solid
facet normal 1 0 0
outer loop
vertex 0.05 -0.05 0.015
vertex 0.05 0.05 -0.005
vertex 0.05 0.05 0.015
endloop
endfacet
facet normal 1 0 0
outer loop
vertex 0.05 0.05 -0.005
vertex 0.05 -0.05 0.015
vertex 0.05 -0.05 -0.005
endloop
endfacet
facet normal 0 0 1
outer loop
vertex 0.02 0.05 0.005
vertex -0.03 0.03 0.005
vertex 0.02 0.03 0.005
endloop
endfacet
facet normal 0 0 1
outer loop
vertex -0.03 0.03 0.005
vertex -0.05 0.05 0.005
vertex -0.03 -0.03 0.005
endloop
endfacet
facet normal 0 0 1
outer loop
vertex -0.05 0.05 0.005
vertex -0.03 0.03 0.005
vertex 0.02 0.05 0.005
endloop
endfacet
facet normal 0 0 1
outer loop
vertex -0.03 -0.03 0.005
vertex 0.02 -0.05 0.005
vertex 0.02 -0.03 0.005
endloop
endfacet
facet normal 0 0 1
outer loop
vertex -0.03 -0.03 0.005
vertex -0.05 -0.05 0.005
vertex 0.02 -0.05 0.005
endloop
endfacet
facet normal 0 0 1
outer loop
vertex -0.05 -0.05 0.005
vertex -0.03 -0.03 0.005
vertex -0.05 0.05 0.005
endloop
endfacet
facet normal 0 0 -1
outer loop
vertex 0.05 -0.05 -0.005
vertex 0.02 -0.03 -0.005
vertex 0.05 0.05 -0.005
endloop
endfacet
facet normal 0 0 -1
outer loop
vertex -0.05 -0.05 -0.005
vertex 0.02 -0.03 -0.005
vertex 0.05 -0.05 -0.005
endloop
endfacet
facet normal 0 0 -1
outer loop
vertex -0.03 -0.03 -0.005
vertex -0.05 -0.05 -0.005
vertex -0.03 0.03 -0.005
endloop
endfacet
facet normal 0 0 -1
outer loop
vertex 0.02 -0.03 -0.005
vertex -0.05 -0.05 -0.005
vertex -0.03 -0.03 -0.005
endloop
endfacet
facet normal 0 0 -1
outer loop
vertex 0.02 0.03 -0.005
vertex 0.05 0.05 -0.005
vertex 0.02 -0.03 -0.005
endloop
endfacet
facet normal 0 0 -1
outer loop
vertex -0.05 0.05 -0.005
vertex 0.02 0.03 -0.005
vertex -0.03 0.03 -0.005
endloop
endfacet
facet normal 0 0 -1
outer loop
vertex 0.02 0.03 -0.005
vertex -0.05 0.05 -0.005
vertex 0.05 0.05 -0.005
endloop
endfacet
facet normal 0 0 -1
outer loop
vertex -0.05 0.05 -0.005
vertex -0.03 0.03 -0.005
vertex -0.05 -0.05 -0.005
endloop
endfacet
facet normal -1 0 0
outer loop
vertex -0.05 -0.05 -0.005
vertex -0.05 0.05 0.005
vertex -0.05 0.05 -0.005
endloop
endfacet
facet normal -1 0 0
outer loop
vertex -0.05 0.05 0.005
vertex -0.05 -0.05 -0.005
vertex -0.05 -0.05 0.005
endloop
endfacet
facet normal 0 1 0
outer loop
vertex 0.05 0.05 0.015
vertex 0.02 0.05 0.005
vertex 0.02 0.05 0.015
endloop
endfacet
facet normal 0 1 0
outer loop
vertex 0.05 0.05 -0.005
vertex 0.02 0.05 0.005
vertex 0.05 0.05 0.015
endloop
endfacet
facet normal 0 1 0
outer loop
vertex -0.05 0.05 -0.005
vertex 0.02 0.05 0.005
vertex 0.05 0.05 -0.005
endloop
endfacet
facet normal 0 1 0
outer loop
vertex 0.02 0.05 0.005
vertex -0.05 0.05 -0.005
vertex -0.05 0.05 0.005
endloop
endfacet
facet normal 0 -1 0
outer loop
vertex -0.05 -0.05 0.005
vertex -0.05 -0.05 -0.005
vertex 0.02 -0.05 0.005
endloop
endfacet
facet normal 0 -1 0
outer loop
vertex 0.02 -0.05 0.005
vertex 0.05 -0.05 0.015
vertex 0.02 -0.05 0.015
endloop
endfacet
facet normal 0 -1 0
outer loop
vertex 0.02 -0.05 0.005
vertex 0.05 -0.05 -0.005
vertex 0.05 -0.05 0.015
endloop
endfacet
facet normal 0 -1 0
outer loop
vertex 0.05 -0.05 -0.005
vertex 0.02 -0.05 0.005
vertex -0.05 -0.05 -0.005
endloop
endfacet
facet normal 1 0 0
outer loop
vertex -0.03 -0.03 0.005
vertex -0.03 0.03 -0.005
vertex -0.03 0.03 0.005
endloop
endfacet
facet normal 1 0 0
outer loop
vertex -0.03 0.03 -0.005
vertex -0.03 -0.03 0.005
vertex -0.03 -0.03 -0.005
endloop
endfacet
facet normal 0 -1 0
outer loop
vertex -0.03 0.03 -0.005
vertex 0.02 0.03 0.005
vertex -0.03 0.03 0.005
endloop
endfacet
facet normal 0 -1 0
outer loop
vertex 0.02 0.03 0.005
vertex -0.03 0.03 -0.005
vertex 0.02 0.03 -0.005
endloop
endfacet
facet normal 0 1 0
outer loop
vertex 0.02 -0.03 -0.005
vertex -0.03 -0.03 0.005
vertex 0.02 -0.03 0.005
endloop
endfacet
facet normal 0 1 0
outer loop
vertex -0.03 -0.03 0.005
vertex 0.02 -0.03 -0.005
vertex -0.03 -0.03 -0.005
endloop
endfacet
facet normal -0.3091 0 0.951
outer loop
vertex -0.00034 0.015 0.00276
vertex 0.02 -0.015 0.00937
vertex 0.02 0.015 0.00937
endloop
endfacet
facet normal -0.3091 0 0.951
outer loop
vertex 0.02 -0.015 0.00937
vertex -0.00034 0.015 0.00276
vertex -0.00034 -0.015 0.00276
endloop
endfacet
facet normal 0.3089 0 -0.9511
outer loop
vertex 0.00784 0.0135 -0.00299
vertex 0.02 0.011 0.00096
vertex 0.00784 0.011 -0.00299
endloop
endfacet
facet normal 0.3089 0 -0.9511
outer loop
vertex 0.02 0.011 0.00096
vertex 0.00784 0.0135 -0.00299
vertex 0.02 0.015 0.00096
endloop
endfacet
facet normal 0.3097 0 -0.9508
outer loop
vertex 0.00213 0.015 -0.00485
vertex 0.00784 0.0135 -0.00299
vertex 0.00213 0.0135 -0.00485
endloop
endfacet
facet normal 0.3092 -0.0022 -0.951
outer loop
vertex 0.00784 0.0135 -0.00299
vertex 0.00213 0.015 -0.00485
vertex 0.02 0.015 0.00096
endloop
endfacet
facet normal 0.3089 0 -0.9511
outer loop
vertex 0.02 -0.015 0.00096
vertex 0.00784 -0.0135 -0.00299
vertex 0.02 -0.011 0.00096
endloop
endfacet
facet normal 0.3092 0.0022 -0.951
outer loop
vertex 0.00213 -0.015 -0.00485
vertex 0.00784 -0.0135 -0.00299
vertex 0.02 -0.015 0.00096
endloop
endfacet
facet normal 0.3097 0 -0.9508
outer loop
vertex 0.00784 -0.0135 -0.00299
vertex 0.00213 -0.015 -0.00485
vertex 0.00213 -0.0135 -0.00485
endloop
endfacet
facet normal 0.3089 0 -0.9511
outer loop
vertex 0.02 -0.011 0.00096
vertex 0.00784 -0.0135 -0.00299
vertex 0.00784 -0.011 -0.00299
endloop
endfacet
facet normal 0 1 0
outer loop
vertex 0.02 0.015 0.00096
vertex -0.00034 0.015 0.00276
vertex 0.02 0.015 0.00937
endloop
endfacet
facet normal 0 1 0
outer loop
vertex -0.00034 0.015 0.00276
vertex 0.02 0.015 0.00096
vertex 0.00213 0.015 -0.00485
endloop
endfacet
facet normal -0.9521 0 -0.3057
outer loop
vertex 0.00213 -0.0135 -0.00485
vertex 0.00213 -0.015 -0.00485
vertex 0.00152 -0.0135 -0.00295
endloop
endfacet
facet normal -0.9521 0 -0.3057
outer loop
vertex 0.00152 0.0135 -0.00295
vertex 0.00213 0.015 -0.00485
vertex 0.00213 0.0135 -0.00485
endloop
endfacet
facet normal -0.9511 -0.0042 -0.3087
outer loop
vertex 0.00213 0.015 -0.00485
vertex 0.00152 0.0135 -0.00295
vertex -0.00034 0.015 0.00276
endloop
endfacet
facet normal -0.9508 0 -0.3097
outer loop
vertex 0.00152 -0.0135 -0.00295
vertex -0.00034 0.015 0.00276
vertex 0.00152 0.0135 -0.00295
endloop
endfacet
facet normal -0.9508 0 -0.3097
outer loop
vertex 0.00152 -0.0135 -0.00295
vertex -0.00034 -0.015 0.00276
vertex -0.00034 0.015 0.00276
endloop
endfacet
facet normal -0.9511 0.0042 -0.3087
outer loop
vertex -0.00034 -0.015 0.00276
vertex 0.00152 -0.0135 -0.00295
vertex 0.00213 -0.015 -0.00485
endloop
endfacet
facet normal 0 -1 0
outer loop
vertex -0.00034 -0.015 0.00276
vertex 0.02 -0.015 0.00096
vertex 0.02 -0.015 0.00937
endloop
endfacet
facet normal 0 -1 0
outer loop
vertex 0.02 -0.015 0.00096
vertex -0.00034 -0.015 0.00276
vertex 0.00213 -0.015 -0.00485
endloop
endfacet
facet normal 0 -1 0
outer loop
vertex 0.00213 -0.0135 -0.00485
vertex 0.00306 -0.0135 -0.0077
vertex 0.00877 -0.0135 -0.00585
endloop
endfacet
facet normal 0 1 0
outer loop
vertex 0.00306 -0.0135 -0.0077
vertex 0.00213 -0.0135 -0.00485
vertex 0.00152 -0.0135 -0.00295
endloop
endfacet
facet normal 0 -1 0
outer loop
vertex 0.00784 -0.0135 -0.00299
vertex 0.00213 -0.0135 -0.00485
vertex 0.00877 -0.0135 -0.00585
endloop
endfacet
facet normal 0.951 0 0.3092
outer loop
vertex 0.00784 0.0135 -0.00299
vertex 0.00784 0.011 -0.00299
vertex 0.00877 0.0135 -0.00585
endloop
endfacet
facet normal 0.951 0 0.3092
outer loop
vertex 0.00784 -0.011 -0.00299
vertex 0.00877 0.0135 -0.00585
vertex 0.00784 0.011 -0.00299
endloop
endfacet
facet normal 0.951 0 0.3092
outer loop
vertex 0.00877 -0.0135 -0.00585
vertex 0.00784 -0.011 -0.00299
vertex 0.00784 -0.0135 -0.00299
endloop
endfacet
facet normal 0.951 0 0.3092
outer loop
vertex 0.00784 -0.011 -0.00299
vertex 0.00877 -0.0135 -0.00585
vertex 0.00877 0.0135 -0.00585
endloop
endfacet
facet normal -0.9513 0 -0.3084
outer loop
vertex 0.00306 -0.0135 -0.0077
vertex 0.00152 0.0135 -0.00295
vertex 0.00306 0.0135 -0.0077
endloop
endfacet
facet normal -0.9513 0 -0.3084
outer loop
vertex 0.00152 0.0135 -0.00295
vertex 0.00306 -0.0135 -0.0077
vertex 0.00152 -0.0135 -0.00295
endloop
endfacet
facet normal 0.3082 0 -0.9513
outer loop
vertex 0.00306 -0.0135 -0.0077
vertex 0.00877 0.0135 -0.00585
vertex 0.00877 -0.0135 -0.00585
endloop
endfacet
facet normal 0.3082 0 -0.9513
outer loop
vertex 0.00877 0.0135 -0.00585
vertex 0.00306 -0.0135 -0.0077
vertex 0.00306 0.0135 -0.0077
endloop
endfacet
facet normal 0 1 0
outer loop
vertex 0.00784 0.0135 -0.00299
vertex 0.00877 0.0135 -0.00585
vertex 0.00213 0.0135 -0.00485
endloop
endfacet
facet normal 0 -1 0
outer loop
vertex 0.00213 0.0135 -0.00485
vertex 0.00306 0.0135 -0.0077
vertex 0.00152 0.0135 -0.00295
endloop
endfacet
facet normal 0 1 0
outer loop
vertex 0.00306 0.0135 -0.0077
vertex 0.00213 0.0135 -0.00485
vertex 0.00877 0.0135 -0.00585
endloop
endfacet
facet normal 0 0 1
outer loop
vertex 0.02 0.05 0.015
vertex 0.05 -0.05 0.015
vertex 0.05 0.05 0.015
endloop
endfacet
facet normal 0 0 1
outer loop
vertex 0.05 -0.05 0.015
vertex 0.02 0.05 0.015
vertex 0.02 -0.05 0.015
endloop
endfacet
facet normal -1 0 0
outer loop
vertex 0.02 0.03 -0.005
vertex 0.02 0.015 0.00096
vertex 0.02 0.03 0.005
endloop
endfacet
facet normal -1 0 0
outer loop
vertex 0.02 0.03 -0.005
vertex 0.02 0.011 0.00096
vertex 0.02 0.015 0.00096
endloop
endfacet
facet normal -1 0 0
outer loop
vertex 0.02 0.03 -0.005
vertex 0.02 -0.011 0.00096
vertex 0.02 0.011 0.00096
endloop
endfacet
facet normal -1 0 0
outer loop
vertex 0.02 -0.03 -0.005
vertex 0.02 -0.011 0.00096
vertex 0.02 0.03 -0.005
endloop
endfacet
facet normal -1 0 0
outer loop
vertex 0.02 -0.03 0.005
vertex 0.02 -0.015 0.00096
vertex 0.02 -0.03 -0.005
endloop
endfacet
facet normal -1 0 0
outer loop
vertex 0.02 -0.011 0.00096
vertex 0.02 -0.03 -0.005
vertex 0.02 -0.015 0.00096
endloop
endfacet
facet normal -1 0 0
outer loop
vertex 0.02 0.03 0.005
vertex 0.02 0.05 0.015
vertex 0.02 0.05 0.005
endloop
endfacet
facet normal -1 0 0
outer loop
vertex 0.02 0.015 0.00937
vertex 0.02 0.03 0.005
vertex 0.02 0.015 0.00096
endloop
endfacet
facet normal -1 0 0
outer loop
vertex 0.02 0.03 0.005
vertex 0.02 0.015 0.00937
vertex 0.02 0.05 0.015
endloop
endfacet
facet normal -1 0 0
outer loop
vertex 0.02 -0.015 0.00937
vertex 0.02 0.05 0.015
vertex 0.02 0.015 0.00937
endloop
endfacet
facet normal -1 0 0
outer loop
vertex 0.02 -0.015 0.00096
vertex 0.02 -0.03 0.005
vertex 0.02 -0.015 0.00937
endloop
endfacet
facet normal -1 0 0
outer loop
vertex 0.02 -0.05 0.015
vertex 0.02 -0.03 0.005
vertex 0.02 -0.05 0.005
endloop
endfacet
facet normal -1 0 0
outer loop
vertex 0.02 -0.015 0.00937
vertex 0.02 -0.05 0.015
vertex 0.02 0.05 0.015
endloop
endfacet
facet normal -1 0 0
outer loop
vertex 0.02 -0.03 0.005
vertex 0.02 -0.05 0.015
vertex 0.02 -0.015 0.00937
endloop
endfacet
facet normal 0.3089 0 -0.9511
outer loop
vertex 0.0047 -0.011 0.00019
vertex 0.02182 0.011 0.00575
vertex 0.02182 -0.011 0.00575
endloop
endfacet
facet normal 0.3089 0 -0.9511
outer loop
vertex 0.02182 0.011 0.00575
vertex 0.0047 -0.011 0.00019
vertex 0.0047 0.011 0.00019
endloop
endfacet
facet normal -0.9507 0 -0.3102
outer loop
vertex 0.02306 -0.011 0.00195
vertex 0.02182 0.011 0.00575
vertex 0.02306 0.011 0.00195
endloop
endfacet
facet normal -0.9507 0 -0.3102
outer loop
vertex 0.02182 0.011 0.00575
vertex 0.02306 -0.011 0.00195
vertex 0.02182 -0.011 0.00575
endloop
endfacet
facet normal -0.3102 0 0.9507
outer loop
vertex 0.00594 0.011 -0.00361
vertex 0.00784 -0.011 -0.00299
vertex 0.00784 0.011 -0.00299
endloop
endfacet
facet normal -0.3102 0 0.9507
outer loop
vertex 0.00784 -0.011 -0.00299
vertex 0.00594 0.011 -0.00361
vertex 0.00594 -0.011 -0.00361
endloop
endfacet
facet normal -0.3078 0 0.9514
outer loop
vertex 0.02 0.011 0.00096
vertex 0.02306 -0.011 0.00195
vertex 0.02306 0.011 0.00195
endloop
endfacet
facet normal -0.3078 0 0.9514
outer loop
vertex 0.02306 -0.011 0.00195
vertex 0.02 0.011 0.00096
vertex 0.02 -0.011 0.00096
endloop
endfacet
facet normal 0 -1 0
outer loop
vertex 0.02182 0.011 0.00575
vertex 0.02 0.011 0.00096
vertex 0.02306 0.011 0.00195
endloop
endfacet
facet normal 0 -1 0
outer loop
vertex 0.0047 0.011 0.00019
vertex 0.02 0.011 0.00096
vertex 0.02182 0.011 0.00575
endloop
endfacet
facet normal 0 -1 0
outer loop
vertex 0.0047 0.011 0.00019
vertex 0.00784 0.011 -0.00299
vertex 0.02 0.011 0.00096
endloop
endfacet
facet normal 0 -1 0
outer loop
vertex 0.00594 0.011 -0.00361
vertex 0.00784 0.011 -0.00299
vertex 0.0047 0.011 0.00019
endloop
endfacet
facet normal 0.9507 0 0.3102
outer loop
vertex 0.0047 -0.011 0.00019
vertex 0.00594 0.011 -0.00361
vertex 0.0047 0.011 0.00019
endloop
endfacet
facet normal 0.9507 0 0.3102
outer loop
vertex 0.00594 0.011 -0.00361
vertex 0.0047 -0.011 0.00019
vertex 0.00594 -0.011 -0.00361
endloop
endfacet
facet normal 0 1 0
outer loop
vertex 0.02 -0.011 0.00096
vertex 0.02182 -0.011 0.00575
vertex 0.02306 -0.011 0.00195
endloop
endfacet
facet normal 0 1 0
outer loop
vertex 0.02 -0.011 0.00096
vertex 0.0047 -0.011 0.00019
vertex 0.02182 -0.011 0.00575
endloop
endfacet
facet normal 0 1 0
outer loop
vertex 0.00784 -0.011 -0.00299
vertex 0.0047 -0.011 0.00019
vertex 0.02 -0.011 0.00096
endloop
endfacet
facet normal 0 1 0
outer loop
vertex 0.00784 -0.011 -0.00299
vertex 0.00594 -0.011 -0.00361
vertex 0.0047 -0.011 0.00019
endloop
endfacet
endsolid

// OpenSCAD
$fn=64;

eps = 0.001;

// Bounding box (mm)
L = 0.1;
W = 0.1;
T = 0.01;  // flat/plate-like thickness

// Frame parameters
frame_wall = 0.02;
window_L = L - 2*frame_wall;
window_W = W - 2*frame_wall;

// End block (thicker region on one side)
end_block_L = 0.03;
end_block_extra = 0.01; // extra thickness over base plate
end_block_T = T + end_block_extra;

// Cantilever tab / hook parameters (protrudes into opening from end block side)
tab_len = 0.028;
tab_w = 0.03;
tab_t = 0.008;
tab_angle = -18; // downward into opening

// Undercut-like gap (visible from top/bottom)
gap_len = 0.018;
gap_w = 0.022;
gap_t = 0.004;

// Small step at tab tip to form latch lip
lip_len = 0.006;
lip_drop = 0.003;

module base_frame() {
  difference() {
    cube([L, W, T], center=true);
    cube([window_L, window_W, T + 2*eps], center=true);
  }
}

module end_block() {
  translate([L/2 - end_block_L/2, 0, (end_block_T - T)/2])
    cube([end_block_L, W, end_block_T], center=true);
}

module cantilever_tab() {
  // Anchor near inner edge of end block, extending into window
  anchor_x = (L/2 - end_block_L) + frame_wall/2;
  translate([anchor_x, 0, 0]) {
    // Main tab
    rotate([0, tab_angle, 0])
      translate([-tab_len/2, 0, (T/2 + tab_t/2 - 0.001)])
        cube([tab_len, tab_w, tab_t], center=true);

    // Lip/step at tip
    rotate([0, tab_angle, 0])
      translate([-tab_len + lip_len/2, 0, (T/2 + tab_t/2 - 0.001) - lip_drop])
        cube([lip_len, tab_w*0.9, tab_t], center=true);
  }
}

module undercut_gap() {
  // Carve a gap under the tab to suggest undercut-like feature
  anchor_x = (L/2 - end_block_L) + frame_wall/2;
  translate([anchor_x, 0, 0]) {
    rotate([0, tab_angle, 0])
      translate([-gap_len/2 - 0.006, 0, (T/2 + gap_t/2 - 0.001)])
        cube([gap_len, gap_w, gap_t], center=true);
  }
}

difference() {
  union() {
    base_frame();
    end_block();
    cantilever_tab();
  }
  undercut_gap();
}
